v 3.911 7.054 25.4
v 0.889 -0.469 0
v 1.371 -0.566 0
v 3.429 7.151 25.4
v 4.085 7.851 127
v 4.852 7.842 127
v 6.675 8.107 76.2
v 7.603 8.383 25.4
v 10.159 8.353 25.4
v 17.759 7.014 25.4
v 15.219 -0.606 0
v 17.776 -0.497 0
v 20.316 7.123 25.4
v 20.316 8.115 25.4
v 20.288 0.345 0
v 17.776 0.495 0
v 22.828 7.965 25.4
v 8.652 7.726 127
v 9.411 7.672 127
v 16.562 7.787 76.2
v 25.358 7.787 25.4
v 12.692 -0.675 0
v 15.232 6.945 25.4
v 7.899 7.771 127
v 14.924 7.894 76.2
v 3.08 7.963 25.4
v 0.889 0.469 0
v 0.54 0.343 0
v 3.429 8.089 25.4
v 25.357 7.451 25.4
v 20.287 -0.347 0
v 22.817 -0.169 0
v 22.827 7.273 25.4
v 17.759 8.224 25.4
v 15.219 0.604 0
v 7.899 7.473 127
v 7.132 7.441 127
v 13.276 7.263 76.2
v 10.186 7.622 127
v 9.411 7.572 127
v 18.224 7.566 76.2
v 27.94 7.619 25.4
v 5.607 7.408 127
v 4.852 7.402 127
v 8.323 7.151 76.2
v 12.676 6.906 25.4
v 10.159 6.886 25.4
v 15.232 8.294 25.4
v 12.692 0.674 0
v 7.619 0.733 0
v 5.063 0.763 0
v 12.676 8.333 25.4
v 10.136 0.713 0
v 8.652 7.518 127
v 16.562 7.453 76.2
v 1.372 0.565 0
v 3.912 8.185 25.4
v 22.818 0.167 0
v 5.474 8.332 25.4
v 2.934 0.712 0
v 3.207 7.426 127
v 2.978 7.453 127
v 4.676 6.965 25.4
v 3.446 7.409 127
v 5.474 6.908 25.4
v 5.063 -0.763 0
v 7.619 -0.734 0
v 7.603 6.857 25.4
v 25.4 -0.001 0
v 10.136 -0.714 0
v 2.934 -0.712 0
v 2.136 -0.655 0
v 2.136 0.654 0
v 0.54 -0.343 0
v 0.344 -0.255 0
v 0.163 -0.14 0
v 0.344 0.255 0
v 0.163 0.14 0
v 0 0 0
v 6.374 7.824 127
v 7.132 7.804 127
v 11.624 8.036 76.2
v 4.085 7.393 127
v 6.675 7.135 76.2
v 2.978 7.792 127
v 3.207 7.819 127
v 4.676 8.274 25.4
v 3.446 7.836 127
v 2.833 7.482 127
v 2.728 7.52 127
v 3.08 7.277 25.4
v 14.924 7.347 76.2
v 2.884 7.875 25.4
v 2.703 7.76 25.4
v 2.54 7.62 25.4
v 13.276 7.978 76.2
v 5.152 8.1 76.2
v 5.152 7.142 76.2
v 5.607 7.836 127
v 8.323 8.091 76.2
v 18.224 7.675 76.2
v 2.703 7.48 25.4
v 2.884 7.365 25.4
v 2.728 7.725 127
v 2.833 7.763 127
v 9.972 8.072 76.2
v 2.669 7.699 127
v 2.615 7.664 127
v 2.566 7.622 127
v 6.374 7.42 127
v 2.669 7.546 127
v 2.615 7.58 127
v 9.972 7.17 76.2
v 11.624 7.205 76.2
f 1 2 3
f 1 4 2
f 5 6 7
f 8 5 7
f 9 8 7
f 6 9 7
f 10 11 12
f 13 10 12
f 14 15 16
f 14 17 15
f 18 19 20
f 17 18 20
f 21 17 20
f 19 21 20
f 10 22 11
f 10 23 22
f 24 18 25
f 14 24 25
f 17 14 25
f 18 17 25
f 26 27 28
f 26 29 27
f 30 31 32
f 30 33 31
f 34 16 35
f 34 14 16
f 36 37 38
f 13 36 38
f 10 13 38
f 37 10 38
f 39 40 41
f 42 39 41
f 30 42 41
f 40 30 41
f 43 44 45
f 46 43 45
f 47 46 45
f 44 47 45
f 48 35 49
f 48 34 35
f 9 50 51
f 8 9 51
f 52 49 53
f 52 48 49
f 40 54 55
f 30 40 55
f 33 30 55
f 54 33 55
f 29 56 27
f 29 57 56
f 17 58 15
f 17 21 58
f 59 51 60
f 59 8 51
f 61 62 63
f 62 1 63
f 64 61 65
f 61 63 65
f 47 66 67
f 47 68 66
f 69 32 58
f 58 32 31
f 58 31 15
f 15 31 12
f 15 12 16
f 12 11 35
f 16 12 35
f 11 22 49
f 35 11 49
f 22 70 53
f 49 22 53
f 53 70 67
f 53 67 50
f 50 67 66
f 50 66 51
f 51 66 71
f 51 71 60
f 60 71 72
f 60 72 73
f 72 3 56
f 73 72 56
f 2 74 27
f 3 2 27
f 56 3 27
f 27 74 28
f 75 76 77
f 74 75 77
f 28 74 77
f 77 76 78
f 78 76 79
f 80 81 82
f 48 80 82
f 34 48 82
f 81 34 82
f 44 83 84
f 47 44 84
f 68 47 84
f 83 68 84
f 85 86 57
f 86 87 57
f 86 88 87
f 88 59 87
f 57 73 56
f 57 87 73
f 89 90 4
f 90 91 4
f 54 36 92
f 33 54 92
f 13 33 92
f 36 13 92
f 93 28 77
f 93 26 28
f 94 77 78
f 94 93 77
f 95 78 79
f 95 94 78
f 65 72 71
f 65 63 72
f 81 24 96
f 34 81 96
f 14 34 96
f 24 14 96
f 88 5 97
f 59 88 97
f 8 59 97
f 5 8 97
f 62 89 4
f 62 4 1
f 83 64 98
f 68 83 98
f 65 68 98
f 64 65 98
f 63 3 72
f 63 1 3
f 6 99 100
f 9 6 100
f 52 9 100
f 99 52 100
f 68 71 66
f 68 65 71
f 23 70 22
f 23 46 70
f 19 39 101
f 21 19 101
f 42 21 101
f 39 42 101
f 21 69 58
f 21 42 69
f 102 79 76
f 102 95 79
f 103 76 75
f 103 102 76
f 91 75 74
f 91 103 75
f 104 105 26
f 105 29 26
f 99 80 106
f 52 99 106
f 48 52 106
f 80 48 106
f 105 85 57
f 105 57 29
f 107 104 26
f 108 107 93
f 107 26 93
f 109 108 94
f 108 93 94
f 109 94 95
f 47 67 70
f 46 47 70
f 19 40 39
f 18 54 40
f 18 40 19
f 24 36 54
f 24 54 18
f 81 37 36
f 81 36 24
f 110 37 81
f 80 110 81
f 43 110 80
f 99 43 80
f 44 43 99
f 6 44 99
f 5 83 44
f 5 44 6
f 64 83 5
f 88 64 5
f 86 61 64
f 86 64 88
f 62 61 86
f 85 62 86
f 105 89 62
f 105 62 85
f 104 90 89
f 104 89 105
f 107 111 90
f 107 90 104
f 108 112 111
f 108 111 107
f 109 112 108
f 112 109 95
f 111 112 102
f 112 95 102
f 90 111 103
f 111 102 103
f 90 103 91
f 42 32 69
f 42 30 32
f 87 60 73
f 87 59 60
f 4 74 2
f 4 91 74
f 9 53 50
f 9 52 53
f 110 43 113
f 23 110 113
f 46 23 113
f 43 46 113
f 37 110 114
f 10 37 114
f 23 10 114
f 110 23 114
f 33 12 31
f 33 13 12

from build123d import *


with BuildPart() as f3:
    # F0 (on Top) → F3 section 0
    with BuildSketch(Plane.XY):
        with BuildLine():
            Line((25.4, -0.001455), (22.81751, 0.166512))
            Line((22.81751, 0.166512), (20.287512, 0.344977))
            Line((20.287512, 0.344977), (17.77562, 0.49516))
            Line((17.77562, 0.49516), (15.219171, 0.604156))
            Line((15.219171, 0.604156), (12.692447, 0.673517))
            Line((12.692447, 0.673517), (10.135998, 0.713151))
            Line((10.135998, 0.713151), (7.619184, 0.732969))
            Line((7.619184, 0.732969), (5.062734, 0.762695))
            Line((5.062734, 0.762695), (2.933788, 0.7116))
            Line((2.933788, 0.7116), (2.136214, 0.654492))
            Line((2.136214, 0.654492), (1.37156, 0.565414))
            Line((1.37156, 0.565414), (0.889012, 0.468913))
            Line((0.889012, 0.468913), (0.540092, 0.342719))
            ThreePointArc((0.540092, 0.342719), (0.251258, 0.200968), (0, 0))
            ThreePointArc((0, 0), (0.251235, -0.200997), (0.540053, -0.342781))
            Line((0.540053, -0.342781), (0.888958, -0.469015))
            Line((0.888958, -0.469015), (1.371495, -0.565571))
            Line((1.371495, -0.565571), (2.136139, -0.654736))
            Line((2.136139, -0.654736), (2.933707, -0.711936))
            Line((2.933707, -0.711936), (5.062647, -0.763275))
            Line((5.062647, -0.763275), (7.6191, -0.733842))
            Line((7.6191, -0.733842), (10.135916, -0.714313))
            Line((10.135916, -0.714313), (12.69237, -0.67497))
            Line((12.69237, -0.67497), (15.219101, -0.605899))
            Line((15.219101, -0.605899), (17.775563, -0.497196))
            Line((17.775563, -0.497196), (20.287473, -0.347301))
            Line((20.287473, -0.347301), (22.817491, -0.169126))
            Line((22.817491, -0.169126), (25.4, -0.001455))
        make_face()
    # F2 (on offset) → F3 section 1
    with BuildSketch(Plane.XY.offset(25.4)):
        with BuildLine():
            Line((7.602647, 6.856725), (10.1591, 6.886158))
            Line((10.1591, 6.886158), (12.675916, 6.905687))
            Line((12.675916, 6.905687), (15.23237, 6.94503))
            Line((15.23237, 6.94503), (17.759101, 7.014101))
            Line((17.759101, 7.014101), (20.315563, 7.122804))
            Line((20.315563, 7.122804), (22.827473, 7.272699))
            Line((22.827473, 7.272699), (25.357491, 7.450874))
            Line((25.357491, 7.450874), (27.94, 7.618545))
            Line((27.94, 7.618545), (25.35751, 7.786512))
            Line((25.35751, 7.786512), (22.827512, 7.964977))
            Line((22.827512, 7.964977), (20.31562, 8.11516))
            Line((20.31562, 8.11516), (17.759171, 8.224156))
            Line((17.759171, 8.224156), (15.232447, 8.293517))
            Line((15.232447, 8.293517), (12.675998, 8.333151))
            Line((12.675998, 8.333151), (10.159184, 8.352969))
            Line((10.159184, 8.352969), (7.602734, 8.382695))
            Line((7.602734, 8.382695), (5.473788, 8.3316))
            Line((5.473788, 8.3316), (4.676214, 8.274492))
            Line((4.676214, 8.274492), (3.91156, 8.185414))
            Line((3.91156, 8.185414), (3.429012, 8.088913))
            Line((3.429012, 8.088913), (3.080092, 7.962719))
            ThreePointArc((3.080092, 7.962719), (2.791258, 7.820968), (2.54, 7.62))
            ThreePointArc((2.54, 7.62), (2.791235, 7.419003), (3.080053, 7.277219))
            Line((3.080053, 7.277219), (3.428958, 7.150985))
            Line((3.428958, 7.150985), (3.911495, 7.054429))
            Line((3.911495, 7.054429), (4.676139, 6.965264))
            Line((4.676139, 6.965264), (5.473707, 6.908064))
            Line((5.473707, 6.908064), (7.602647, 6.856725))
        make_face()
    loft()

    # F5 (on offset) → F6 section 0
    with BuildSketch(Plane.XY.offset(127)):
        with BuildLine():
            Line((4.084847, 7.393458), (4.851783, 7.402288))
            Line((4.851783, 7.402288), (5.606828, 7.408147))
            Line((5.606828, 7.408147), (6.373764, 7.41995))
            Line((6.373764, 7.41995), (7.131783, 7.440671))
            Line((7.131783, 7.440671), (7.898722, 7.473282))
            Line((7.898722, 7.473282), (8.652295, 7.518251))
            Line((8.652295, 7.518251), (9.4113, 7.571703))
            Line((9.4113, 7.571703), (10.186053, 7.622005))
            Line((10.186053, 7.622005), (9.411306, 7.672395))
            Line((9.411306, 7.672395), (8.652307, 7.725934))
            Line((8.652307, 7.725934), (7.898739, 7.770989))
            Line((7.898739, 7.770989), (7.131804, 7.803688))
            Line((7.131804, 7.803688), (6.373787, 7.824496))
            Line((6.373787, 7.824496), (5.606852, 7.836386))
            Line((5.606852, 7.836386), (4.851808, 7.842332))
            Line((4.851808, 7.842332), (4.084873, 7.851249))
            Line((4.084873, 7.851249), (3.44619, 7.835921))
            Line((3.44619, 7.835921), (3.206917, 7.818788))
            Line((3.206917, 7.818788), (2.977521, 7.792065))
            Line((2.977521, 7.792065), (2.832757, 7.763115))
            Line((2.832757, 7.763115), (2.728081, 7.725257))
            ThreePointArc((2.728081, 7.725257), (2.64143, 7.682731), (2.566053, 7.622441))
            ThreePointArc((2.566053, 7.622441), (2.641424, 7.562142), (2.728069, 7.519607))
            Line((2.728069, 7.519607), (2.83274, 7.481737))
            Line((2.83274, 7.481737), (2.977502, 7.45277))
            Line((2.977502, 7.45277), (3.206895, 7.42602))
            Line((3.206895, 7.42602), (3.446165, 7.40886))
            Line((3.446165, 7.40886), (4.084847, 7.393458))
        make_face()
    # F2 (on offset) → F6 section 1
    with BuildSketch(Plane.XY.offset(25.4)):
        with BuildLine():
            Line((7.602647, 6.856725), (10.1591, 6.886158))
            Line((10.1591, 6.886158), (12.675916, 6.905687))
            Line((12.675916, 6.905687), (15.23237, 6.94503))
            Line((15.23237, 6.94503), (17.759101, 7.014101))
            Line((17.759101, 7.014101), (20.315563, 7.122804))
            Line((20.315563, 7.122804), (22.827473, 7.272699))
            Line((22.827473, 7.272699), (25.357491, 7.450874))
            Line((25.357491, 7.450874), (27.94, 7.618545))
            Line((27.94, 7.618545), (25.35751, 7.786512))
            Line((25.35751, 7.786512), (22.827512, 7.964977))
            Line((22.827512, 7.964977), (20.31562, 8.11516))
            Line((20.31562, 8.11516), (17.759171, 8.224156))
            Line((17.759171, 8.224156), (15.232447, 8.293517))
            Line((15.232447, 8.293517), (12.675998, 8.333151))
            Line((12.675998, 8.333151), (10.159184, 8.352969))
            Line((10.159184, 8.352969), (7.602734, 8.382695))
            Line((7.602734, 8.382695), (5.473788, 8.3316))
            Line((5.473788, 8.3316), (4.676214, 8.274492))
            Line((4.676214, 8.274492), (3.91156, 8.185414))
            Line((3.91156, 8.185414), (3.429012, 8.088913))
            Line((3.429012, 8.088913), (3.080092, 7.962719))
            ThreePointArc((3.080092, 7.962719), (2.791258, 7.820968), (2.54, 7.62))
            ThreePointArc((2.54, 7.62), (2.791235, 7.419003), (3.080053, 7.277219))
            Line((3.080053, 7.277219), (3.428958, 7.150985))
            Line((3.428958, 7.150985), (3.911495, 7.054429))
            Line((3.911495, 7.054429), (4.676139, 6.965264))
            Line((4.676139, 6.965264), (5.473707, 6.908064))
            Line((5.473707, 6.908064), (7.602647, 6.856725))
        make_face()
    loft()


solid = f3.part
